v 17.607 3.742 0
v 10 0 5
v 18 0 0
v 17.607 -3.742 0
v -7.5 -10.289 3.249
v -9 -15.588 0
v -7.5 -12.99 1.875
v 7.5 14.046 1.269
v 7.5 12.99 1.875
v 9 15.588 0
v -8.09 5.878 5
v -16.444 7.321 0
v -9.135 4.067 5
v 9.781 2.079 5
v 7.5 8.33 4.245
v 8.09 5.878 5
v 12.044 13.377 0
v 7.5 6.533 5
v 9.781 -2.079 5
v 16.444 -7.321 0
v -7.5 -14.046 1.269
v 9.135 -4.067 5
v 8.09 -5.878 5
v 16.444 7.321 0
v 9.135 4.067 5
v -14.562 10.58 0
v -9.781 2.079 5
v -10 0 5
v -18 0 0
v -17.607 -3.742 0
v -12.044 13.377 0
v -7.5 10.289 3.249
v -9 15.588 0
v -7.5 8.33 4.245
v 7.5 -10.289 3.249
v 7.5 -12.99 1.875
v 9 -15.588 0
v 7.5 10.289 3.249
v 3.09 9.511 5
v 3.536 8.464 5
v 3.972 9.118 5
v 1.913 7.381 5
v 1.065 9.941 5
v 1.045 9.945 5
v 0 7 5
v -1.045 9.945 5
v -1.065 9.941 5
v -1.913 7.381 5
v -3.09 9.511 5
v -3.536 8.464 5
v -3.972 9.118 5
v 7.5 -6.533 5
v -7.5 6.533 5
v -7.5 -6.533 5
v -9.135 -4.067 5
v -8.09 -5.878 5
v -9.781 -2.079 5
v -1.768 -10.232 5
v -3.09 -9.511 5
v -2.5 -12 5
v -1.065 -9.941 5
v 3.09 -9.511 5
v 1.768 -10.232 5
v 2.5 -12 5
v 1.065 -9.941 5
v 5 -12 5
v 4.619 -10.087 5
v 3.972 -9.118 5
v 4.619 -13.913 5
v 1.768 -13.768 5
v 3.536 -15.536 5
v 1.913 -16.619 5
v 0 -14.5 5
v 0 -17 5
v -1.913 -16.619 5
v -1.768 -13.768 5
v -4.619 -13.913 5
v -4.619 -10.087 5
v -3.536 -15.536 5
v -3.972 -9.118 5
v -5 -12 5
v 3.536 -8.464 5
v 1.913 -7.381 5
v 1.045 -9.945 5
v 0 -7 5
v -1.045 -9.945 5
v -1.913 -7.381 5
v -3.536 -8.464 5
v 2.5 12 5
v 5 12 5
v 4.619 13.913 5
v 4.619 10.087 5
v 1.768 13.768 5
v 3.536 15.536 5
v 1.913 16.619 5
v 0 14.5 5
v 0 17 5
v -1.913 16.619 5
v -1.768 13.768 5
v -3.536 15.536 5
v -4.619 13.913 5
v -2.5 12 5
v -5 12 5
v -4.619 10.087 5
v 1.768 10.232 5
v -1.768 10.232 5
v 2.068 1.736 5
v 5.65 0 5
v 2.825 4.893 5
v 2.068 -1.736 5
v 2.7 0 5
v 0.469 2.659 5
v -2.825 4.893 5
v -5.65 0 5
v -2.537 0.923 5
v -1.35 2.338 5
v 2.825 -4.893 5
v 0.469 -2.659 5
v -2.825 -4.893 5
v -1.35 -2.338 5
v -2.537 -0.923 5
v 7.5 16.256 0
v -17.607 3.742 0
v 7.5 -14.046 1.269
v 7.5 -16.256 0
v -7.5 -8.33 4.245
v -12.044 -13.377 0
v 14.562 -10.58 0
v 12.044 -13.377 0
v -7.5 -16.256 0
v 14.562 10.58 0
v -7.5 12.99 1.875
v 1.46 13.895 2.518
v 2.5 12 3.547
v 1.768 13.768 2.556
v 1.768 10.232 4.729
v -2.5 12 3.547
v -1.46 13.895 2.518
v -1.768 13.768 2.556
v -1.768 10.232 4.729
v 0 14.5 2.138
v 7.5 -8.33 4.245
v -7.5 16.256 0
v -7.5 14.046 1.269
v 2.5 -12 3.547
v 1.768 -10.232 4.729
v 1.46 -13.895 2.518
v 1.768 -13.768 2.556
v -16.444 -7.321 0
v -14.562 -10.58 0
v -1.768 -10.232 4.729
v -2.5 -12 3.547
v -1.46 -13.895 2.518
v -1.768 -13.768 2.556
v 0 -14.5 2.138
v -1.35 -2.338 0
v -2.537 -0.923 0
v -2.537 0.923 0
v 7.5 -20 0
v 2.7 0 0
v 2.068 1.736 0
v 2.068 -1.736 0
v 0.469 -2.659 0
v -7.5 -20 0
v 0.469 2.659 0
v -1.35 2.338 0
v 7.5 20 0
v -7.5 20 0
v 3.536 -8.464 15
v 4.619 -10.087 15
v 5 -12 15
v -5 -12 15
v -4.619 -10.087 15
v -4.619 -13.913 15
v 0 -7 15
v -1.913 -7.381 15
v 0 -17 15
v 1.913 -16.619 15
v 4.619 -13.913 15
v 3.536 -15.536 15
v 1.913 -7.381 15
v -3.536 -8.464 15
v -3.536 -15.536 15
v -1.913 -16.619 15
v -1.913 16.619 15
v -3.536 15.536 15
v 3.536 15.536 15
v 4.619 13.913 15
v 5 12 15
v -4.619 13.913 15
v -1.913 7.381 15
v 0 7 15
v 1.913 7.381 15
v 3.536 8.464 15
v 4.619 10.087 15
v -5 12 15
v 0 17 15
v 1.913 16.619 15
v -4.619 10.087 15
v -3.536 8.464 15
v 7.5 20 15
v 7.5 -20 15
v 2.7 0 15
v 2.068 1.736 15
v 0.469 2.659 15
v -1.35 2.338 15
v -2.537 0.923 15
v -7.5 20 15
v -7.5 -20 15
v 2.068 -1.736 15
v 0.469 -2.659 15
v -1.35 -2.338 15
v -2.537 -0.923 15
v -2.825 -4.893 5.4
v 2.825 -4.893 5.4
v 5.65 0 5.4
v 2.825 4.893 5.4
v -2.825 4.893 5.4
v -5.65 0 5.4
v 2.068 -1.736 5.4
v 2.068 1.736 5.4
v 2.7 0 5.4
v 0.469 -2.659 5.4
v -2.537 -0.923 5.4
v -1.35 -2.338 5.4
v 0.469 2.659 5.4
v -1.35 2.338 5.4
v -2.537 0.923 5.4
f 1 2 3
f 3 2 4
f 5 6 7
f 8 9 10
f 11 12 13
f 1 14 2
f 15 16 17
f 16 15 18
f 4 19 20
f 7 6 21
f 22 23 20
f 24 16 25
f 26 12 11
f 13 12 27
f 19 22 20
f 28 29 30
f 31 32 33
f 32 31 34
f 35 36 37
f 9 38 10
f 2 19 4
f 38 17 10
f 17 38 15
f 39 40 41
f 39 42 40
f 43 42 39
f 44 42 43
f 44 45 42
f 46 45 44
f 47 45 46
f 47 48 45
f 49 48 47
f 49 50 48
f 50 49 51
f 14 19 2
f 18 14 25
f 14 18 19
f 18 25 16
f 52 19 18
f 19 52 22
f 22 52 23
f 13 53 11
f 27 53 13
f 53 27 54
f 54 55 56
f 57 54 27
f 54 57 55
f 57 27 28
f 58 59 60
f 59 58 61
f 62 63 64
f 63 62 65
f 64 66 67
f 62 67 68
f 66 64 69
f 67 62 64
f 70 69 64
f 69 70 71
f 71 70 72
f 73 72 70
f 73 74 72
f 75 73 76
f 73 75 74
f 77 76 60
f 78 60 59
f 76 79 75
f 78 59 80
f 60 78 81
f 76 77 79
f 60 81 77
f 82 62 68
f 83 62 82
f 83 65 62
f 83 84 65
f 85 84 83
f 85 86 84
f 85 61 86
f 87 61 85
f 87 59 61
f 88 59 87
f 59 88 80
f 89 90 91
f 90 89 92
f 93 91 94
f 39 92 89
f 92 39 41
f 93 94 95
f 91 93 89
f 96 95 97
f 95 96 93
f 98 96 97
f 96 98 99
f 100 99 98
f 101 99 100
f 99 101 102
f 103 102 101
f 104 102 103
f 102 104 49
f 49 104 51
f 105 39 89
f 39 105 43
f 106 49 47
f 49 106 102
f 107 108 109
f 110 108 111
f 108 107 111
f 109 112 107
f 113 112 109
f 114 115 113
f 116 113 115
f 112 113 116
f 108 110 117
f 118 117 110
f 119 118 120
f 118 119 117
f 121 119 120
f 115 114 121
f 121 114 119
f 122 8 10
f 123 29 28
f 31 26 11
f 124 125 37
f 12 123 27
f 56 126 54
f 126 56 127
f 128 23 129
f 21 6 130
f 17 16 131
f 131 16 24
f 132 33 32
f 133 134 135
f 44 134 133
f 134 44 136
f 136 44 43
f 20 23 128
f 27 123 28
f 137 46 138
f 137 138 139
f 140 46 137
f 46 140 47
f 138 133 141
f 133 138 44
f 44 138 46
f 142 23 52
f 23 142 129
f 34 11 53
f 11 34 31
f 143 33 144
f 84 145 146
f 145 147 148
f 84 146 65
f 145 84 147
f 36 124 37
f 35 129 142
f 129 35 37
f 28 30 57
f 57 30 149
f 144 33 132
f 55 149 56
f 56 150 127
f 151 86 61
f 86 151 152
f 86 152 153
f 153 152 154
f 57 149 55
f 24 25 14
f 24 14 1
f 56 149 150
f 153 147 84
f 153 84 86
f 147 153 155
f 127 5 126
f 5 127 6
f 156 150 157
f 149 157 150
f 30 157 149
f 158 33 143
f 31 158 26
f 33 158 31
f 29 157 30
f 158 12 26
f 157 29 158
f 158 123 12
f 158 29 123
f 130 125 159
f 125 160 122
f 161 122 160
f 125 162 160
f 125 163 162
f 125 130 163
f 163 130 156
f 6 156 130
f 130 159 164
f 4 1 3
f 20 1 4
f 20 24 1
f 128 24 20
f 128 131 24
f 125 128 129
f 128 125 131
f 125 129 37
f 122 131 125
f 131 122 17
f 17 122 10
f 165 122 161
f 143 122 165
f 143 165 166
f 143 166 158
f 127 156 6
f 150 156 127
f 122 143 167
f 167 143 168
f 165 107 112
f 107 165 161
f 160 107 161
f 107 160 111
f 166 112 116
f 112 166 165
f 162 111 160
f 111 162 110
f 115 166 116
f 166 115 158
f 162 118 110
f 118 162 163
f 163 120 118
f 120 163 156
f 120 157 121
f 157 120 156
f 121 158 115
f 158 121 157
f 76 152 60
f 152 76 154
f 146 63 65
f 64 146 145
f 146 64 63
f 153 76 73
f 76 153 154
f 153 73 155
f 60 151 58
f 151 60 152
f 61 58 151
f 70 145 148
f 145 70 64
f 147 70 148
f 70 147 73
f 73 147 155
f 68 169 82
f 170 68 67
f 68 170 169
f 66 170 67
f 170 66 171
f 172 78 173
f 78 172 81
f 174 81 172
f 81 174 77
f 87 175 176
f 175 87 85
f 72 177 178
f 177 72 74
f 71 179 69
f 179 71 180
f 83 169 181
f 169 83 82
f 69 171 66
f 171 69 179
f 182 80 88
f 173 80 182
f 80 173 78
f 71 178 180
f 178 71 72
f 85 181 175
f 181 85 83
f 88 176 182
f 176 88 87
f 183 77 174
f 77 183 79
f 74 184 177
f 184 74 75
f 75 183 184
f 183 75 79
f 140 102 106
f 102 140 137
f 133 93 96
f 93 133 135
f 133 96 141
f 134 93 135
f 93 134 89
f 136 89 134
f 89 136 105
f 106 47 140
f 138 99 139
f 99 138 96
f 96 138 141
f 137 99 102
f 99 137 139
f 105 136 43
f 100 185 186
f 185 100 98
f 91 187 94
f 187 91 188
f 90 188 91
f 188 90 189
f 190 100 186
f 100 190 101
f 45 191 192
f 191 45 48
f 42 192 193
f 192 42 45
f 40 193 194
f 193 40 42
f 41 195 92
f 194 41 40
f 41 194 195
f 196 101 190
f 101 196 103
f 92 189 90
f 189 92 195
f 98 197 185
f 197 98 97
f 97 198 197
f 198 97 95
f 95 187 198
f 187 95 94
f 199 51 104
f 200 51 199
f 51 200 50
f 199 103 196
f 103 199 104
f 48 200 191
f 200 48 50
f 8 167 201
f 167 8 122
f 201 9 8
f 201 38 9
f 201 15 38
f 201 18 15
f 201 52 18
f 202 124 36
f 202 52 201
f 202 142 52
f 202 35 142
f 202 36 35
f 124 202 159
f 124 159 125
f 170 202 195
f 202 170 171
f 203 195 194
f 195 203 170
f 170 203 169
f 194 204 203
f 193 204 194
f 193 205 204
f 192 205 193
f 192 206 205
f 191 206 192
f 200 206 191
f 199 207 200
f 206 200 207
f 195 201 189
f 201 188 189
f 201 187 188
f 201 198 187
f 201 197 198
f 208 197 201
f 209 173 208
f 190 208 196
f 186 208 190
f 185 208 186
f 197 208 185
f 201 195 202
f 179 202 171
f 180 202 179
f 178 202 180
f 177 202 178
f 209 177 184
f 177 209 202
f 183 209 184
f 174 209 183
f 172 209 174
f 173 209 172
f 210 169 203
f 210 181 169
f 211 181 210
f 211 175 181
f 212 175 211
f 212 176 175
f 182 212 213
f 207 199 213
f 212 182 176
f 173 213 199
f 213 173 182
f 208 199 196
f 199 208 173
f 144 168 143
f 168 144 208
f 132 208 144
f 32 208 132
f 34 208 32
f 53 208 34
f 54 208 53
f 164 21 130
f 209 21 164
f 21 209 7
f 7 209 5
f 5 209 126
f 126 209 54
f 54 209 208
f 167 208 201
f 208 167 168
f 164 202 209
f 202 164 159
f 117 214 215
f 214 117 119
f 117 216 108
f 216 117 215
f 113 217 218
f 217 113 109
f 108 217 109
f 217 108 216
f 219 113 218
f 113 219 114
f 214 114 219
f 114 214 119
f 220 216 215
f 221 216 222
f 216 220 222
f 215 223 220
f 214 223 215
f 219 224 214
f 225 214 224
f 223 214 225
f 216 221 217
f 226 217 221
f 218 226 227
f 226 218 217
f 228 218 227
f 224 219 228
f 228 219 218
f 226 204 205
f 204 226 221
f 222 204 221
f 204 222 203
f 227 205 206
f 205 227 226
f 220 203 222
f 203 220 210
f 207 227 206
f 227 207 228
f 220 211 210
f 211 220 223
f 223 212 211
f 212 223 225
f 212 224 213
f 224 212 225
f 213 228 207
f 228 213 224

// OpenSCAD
module end() {
    difference() {
        cylinder(r1=18,r=10,h=5);
        cylinder(r=2.7,h=5);
    }
}
module holder() {
    difference(){
        translate([0,0,7.5])cube([15,40,15],center=true);
        cylinder(r=11.3/2,h=5.4,$fn=6);
        cylinder(r=5.4/2,h=15);
        for(i=[-1,1])translate([0,i*12]){
            cylinder(h=15,r=2.5);
            translate([0,0,5])cylinder(h=15,r=5);
        }
    }
}
end();
holder();
